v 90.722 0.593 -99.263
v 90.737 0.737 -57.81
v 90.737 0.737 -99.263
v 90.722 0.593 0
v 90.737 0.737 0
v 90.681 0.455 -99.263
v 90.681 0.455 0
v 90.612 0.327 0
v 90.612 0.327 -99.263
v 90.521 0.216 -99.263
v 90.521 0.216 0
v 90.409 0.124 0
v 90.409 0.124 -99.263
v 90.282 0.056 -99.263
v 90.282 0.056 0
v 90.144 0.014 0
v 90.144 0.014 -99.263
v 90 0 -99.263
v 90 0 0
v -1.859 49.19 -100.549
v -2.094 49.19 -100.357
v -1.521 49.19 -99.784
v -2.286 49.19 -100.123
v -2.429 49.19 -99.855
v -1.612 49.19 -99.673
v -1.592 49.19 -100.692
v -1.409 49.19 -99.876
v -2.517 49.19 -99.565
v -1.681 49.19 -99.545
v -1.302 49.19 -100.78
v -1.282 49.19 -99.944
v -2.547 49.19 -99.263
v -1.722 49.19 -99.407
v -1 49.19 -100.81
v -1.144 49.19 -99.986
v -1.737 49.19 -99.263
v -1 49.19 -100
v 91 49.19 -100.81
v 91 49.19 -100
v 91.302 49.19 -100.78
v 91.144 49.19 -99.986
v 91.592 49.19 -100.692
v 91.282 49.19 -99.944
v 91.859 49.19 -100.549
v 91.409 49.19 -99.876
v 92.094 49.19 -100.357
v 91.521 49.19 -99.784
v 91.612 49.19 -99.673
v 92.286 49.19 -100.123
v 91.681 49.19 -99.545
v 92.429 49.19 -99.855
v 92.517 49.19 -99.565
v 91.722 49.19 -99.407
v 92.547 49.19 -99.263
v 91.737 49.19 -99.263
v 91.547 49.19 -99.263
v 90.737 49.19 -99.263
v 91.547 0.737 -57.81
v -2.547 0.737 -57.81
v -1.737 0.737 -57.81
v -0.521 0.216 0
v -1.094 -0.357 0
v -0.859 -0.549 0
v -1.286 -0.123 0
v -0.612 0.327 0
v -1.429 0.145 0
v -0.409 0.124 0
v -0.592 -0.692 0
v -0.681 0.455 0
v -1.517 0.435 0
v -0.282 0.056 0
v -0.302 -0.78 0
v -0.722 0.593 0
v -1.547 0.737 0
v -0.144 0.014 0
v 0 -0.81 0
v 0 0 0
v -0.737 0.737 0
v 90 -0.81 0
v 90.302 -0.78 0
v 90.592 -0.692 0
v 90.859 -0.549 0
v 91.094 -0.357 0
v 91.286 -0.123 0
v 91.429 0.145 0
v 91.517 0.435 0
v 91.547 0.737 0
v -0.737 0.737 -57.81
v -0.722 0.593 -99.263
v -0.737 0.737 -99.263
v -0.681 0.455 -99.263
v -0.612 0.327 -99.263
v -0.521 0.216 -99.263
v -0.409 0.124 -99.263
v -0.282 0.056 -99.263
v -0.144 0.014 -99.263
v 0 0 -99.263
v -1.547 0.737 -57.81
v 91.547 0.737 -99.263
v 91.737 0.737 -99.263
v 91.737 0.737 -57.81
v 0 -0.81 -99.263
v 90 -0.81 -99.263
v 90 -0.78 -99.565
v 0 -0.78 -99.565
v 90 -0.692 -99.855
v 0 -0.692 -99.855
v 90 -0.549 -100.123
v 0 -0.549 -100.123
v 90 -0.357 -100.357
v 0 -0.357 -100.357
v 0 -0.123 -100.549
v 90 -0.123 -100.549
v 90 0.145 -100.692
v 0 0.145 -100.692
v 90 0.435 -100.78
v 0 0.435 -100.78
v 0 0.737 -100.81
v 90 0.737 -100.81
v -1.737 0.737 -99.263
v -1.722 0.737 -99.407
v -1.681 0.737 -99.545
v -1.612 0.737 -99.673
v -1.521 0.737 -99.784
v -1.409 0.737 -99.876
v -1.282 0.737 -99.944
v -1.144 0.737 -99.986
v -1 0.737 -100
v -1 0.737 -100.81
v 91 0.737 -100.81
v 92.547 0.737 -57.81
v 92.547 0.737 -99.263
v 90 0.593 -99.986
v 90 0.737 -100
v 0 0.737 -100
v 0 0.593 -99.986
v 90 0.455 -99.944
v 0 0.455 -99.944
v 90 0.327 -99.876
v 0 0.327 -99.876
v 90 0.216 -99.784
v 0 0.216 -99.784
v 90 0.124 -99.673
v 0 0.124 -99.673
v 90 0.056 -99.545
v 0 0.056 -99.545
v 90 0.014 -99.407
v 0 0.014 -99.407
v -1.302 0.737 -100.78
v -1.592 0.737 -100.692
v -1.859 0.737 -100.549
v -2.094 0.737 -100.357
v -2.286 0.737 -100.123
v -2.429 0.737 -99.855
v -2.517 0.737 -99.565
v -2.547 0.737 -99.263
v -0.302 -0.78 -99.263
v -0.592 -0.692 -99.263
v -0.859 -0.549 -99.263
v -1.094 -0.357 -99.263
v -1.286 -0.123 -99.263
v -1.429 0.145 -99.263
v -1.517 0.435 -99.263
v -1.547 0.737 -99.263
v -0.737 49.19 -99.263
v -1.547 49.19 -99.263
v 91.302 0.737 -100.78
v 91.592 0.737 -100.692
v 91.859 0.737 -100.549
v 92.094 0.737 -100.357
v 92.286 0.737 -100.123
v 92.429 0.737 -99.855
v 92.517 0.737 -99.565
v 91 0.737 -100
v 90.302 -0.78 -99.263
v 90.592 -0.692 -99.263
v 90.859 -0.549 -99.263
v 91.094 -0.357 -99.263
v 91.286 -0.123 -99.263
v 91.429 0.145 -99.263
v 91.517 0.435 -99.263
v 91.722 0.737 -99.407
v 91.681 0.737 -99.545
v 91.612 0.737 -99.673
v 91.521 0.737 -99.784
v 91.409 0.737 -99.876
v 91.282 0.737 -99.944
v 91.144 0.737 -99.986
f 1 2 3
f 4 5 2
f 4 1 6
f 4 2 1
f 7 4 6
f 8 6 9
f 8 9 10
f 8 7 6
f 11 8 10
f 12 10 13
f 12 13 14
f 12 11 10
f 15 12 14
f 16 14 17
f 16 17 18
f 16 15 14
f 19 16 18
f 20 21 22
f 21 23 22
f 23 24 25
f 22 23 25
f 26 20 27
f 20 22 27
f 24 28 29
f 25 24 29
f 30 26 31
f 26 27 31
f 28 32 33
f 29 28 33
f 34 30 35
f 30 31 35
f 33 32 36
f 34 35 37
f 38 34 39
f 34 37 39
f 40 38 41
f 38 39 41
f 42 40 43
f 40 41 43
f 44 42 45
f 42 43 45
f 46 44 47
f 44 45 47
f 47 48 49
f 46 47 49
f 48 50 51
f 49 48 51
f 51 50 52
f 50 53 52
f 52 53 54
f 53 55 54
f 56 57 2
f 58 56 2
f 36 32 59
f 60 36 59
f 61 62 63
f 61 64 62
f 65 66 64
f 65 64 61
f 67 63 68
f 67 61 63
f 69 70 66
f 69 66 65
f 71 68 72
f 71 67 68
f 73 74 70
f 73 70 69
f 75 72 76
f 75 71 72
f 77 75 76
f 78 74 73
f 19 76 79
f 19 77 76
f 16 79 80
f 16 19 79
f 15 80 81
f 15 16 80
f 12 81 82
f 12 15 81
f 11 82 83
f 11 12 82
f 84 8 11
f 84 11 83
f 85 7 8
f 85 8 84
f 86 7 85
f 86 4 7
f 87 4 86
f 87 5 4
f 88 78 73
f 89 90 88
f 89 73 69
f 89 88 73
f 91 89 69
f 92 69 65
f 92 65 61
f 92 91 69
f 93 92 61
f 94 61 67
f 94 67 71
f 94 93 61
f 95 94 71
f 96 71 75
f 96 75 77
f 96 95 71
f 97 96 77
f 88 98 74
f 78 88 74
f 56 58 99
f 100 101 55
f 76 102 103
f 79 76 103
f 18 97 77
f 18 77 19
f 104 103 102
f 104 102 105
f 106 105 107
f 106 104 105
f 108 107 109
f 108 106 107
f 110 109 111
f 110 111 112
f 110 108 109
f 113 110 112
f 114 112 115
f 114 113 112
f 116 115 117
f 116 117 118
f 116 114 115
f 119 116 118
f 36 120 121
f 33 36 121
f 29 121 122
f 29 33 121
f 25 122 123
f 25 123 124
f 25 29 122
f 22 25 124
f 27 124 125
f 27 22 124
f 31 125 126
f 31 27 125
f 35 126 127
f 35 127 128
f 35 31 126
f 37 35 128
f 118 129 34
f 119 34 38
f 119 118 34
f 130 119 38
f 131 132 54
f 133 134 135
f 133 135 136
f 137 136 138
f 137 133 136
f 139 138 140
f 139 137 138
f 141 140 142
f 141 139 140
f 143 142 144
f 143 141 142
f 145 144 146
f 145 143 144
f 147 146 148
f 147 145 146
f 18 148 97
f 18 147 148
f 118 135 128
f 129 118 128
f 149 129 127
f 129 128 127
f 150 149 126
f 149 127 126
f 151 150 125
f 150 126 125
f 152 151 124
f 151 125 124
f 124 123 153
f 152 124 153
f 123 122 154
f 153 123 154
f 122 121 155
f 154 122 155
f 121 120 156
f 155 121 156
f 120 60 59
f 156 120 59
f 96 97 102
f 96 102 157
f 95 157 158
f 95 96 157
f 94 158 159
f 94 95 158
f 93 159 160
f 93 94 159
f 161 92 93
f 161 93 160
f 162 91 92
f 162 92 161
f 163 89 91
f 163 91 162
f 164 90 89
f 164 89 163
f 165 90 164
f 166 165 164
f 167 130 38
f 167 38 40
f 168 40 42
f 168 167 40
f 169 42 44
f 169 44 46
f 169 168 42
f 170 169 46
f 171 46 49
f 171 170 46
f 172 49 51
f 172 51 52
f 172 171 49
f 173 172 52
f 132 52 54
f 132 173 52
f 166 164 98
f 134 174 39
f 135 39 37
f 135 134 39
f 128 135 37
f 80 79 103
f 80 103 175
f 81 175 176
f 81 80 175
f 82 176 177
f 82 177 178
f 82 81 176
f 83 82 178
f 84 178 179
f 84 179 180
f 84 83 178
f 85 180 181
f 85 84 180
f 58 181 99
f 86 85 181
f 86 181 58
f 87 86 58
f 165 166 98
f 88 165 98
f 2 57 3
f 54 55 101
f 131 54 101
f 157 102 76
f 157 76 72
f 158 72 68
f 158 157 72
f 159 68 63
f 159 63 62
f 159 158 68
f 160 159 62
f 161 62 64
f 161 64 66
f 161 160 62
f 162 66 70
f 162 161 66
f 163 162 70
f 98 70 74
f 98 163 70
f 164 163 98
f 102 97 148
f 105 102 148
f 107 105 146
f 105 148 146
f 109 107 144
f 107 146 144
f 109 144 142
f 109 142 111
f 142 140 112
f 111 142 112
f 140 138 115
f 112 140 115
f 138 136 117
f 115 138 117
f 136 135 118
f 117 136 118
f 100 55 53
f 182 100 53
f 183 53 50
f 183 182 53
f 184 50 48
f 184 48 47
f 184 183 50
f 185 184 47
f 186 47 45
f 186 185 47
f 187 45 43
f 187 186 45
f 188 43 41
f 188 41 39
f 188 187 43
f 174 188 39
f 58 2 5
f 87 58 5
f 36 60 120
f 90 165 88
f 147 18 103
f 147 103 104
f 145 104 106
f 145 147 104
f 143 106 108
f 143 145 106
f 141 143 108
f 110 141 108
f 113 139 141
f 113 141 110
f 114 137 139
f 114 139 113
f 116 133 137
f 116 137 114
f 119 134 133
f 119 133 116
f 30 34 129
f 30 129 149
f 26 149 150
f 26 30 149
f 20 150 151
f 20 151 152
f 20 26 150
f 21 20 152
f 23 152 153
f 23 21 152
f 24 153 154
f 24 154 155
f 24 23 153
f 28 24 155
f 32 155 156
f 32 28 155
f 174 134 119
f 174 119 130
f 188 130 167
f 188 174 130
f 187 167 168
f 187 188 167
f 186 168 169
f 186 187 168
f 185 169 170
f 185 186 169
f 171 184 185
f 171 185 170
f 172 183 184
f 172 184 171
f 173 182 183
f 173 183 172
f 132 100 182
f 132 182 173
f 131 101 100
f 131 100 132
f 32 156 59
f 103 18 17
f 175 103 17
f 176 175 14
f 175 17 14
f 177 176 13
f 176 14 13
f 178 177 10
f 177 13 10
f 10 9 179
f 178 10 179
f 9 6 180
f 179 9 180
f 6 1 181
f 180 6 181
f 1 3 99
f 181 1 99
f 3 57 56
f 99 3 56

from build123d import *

# Parameters (mm, degrees)
SKETCH1_W                    = 90
SKETCH1_H                    = 100
BASE_FLANGE1_DEPTH           = 0.81
EDGE_FLANGE1_STRIP_W         = 4.7132
EDGE_FLANGE1_STRIP_H         = 0.81
EDGE_FLANGE1_STRIP_CUT_DEPTH = 90
EDGE_FLANGE1_DEPTH           = 90
EDGE_FLANGE2_DEPTH           = 48.4534
EDGE_FLANGE2_BEND_DEPTH      = 48.4534
EDGE_FLANGE3_DEPTH           = 99.2634
EDGE_FLANGE3_BEND_DEPTH      = 99.2634
CUT_EXTRUDE1_REACH           = 149.055


# Sheet-metal steps are written as plain solids
with BuildPart() as part:
    # Sketch1 → Base-Flange1 (new body)
    with BuildSketch(Plane(origin=(0, 0, 0), x_dir=(1, 0, 0), z_dir=(0, 1, 0))):
        with Locations((45, 50)):
            Rectangle(SKETCH1_W, SKETCH1_H)
    extrude(amount=-BASE_FLANGE1_DEPTH)

    # Edge-Flange1 strip (across the edge) → Edge-Flange1 strip cut (cut)
    with BuildSketch(Plane(origin=(90, 0, -100), x_dir=(0, 0, 1), z_dir=(-1, 0, 0))):
        with Locations((-1.62, -0.405)):
            Rectangle(EDGE_FLANGE1_STRIP_W, EDGE_FLANGE1_STRIP_H)
    extrude(amount=EDGE_FLANGE1_STRIP_CUT_DEPTH, mode=Mode.SUBTRACT)

    # Edge-Flange1 section (across the edge) → Edge-Flange1 (add)
    with BuildSketch(Plane(origin=(90, 0, -100), x_dir=(0, 0, 1), z_dir=(-1, 0, 0))):
        with BuildLine():
            Line((-0.81, 0.7366), (-0.81, 49.19))
            Line((-0.81, 49.19), (0, 49.19))
            Line((0, 49.19), (0, 0.7366))
            ThreePointArc((0, 0.7366), (0.215745145, 0.215745145), (0.7366, 0))
            Line((0.7366, 0), (0.7366, -0.81))
            ThreePointArc((0.7366, -0.81), (-0.357011348, -0.357011348), (-0.81, 0.7366))
        make_face()
    extrude(amount=EDGE_FLANGE1_DEPTH)

    # Edge-Flange2 section (across the edge) → Edge-Flange2 (add)
    with BuildSketch(Plane(origin=(-1.7366, 49.19, -100), x_dir=(1, 0, 0), z_dir=(0, -1, 0))):
        with BuildLine():
            Line((-0.81, 0.7366), (-0.81, 42.19))
            Line((-0.81, 42.19), (0, 42.19))
            Line((0, 42.19), (0, 0.7366))
            ThreePointArc((0, 0.7366), (0.215745145, 0.215745145), (0.7366, 0))
            Line((0.7366, 0), (1.7366, 0))
            Line((1.7366, 0), (1.7366, -0.81))
            Line((1.7366, -0.81), (0.7366, -0.81))
            ThreePointArc((0.7366, -0.81), (-0.357011348, -0.357011348), (-0.81, 0.7366))
        make_face()
    extrude(amount=EDGE_FLANGE2_DEPTH)

    # Edge-Flange2 section 2 (across the edge) → Edge-Flange2 bend (add)
    with BuildSketch(Plane(origin=(91.7366, 0.7366, -100), x_dir=(-1, 0, 0), z_dir=(0, 1, 0))):
        with BuildLine():
            Line((-0.81, 0.7366), (-0.81, 42.19))
            Line((-0.81, 42.19), (0, 42.19))
            Line((0, 42.19), (0, 0.7366))
            ThreePointArc((0, 0.7366), (0.215745145, 0.215745145), (0.7366, 0))
            Line((0.7366, 0), (1.7366, 0))
            Line((1.7366, 0), (1.7366, -0.81))
            Line((1.7366, -0.81), (0.7366, -0.81))
            ThreePointArc((0.7366, -0.81), (-0.357011348, -0.357011348), (-0.81, 0.7366))
        make_face()
    extrude(amount=EDGE_FLANGE2_BEND_DEPTH)

    # Edge-Flange3 section (across the edge) → Edge-Flange3 (add)
    with BuildSketch(Plane(origin=(-0.7366, 0, -99.2634), x_dir=(1, 0, 0), z_dir=(0, 0, 1))):
        with BuildLine():
            Line((-0.81, 0.7366), (-0.81, 49.19))
            Line((-0.81, 49.19), (0, 49.19))
            Line((0, 49.19), (0, 0.7366))
            ThreePointArc((0, 0.7366), (0.215745145, 0.215745145), (0.7366, 0))
            Line((0.7366, 0), (0.7366, -0.81))
            ThreePointArc((0.7366, -0.81), (-0.357011348, -0.357011348), (-0.81, 0.7366))
        make_face()
    extrude(amount=EDGE_FLANGE3_DEPTH)

    # Edge-Flange3 section 2 (across the edge) → Edge-Flange3 bend (add)
    with BuildSketch(Plane(origin=(90.7366, 0, 0), x_dir=(-1, 0, 0), z_dir=(0, 0, -1))):
        with BuildLine():
            Line((-0.81, 0.7366), (-0.81, 49.19))
            Line((-0.81, 49.19), (0, 49.19))
            Line((0, 49.19), (0, 0.7366))
            ThreePointArc((0, 0.7366), (0.215745145, 0.215745145), (0.7366, 0))
            Line((0.7366, 0), (0.7366, -0.81))
            ThreePointArc((0.7366, -0.81), (-0.357011348, -0.357011348), (-0.81, 0.7366))
        make_face()
    extrude(amount=EDGE_FLANGE3_BEND_DEPTH)

    # Cut-Extrude1: up to this face of the body (flat: up to its plane)
    cut_extrude1_end = Plane(part.part.faces().sort_by_distance((92.5466, 24.9633, -78.5367))[0])
    # Sketch23 → Cut-Extrude1 (cut, up to the picked face)
    with BuildSketch(Plane.ZY.offset(2.5466), mode=Mode.PRIVATE) as cut_extrude1_sk1:
        Polygon((-99.2634, 49.19), (-57.81, 0.7366), (0, 0.7366), (0, 49.19), align=None)
    cut_extrude1_tool1 = split(extrude(cut_extrude1_sk1.sketch, amount=-CUT_EXTRUDE1_REACH, mode=Mode.PRIVATE), bisect_by=cut_extrude1_end, keep=Keep.BOTH, mode=Mode.PRIVATE)
    add(cut_extrude1_tool1.solids().sort_by(Axis((-2.5466, 27.094531, -40.180017), (1, 0, 0)))[0], mode=Mode.SUBTRACT)


solid = part.part
